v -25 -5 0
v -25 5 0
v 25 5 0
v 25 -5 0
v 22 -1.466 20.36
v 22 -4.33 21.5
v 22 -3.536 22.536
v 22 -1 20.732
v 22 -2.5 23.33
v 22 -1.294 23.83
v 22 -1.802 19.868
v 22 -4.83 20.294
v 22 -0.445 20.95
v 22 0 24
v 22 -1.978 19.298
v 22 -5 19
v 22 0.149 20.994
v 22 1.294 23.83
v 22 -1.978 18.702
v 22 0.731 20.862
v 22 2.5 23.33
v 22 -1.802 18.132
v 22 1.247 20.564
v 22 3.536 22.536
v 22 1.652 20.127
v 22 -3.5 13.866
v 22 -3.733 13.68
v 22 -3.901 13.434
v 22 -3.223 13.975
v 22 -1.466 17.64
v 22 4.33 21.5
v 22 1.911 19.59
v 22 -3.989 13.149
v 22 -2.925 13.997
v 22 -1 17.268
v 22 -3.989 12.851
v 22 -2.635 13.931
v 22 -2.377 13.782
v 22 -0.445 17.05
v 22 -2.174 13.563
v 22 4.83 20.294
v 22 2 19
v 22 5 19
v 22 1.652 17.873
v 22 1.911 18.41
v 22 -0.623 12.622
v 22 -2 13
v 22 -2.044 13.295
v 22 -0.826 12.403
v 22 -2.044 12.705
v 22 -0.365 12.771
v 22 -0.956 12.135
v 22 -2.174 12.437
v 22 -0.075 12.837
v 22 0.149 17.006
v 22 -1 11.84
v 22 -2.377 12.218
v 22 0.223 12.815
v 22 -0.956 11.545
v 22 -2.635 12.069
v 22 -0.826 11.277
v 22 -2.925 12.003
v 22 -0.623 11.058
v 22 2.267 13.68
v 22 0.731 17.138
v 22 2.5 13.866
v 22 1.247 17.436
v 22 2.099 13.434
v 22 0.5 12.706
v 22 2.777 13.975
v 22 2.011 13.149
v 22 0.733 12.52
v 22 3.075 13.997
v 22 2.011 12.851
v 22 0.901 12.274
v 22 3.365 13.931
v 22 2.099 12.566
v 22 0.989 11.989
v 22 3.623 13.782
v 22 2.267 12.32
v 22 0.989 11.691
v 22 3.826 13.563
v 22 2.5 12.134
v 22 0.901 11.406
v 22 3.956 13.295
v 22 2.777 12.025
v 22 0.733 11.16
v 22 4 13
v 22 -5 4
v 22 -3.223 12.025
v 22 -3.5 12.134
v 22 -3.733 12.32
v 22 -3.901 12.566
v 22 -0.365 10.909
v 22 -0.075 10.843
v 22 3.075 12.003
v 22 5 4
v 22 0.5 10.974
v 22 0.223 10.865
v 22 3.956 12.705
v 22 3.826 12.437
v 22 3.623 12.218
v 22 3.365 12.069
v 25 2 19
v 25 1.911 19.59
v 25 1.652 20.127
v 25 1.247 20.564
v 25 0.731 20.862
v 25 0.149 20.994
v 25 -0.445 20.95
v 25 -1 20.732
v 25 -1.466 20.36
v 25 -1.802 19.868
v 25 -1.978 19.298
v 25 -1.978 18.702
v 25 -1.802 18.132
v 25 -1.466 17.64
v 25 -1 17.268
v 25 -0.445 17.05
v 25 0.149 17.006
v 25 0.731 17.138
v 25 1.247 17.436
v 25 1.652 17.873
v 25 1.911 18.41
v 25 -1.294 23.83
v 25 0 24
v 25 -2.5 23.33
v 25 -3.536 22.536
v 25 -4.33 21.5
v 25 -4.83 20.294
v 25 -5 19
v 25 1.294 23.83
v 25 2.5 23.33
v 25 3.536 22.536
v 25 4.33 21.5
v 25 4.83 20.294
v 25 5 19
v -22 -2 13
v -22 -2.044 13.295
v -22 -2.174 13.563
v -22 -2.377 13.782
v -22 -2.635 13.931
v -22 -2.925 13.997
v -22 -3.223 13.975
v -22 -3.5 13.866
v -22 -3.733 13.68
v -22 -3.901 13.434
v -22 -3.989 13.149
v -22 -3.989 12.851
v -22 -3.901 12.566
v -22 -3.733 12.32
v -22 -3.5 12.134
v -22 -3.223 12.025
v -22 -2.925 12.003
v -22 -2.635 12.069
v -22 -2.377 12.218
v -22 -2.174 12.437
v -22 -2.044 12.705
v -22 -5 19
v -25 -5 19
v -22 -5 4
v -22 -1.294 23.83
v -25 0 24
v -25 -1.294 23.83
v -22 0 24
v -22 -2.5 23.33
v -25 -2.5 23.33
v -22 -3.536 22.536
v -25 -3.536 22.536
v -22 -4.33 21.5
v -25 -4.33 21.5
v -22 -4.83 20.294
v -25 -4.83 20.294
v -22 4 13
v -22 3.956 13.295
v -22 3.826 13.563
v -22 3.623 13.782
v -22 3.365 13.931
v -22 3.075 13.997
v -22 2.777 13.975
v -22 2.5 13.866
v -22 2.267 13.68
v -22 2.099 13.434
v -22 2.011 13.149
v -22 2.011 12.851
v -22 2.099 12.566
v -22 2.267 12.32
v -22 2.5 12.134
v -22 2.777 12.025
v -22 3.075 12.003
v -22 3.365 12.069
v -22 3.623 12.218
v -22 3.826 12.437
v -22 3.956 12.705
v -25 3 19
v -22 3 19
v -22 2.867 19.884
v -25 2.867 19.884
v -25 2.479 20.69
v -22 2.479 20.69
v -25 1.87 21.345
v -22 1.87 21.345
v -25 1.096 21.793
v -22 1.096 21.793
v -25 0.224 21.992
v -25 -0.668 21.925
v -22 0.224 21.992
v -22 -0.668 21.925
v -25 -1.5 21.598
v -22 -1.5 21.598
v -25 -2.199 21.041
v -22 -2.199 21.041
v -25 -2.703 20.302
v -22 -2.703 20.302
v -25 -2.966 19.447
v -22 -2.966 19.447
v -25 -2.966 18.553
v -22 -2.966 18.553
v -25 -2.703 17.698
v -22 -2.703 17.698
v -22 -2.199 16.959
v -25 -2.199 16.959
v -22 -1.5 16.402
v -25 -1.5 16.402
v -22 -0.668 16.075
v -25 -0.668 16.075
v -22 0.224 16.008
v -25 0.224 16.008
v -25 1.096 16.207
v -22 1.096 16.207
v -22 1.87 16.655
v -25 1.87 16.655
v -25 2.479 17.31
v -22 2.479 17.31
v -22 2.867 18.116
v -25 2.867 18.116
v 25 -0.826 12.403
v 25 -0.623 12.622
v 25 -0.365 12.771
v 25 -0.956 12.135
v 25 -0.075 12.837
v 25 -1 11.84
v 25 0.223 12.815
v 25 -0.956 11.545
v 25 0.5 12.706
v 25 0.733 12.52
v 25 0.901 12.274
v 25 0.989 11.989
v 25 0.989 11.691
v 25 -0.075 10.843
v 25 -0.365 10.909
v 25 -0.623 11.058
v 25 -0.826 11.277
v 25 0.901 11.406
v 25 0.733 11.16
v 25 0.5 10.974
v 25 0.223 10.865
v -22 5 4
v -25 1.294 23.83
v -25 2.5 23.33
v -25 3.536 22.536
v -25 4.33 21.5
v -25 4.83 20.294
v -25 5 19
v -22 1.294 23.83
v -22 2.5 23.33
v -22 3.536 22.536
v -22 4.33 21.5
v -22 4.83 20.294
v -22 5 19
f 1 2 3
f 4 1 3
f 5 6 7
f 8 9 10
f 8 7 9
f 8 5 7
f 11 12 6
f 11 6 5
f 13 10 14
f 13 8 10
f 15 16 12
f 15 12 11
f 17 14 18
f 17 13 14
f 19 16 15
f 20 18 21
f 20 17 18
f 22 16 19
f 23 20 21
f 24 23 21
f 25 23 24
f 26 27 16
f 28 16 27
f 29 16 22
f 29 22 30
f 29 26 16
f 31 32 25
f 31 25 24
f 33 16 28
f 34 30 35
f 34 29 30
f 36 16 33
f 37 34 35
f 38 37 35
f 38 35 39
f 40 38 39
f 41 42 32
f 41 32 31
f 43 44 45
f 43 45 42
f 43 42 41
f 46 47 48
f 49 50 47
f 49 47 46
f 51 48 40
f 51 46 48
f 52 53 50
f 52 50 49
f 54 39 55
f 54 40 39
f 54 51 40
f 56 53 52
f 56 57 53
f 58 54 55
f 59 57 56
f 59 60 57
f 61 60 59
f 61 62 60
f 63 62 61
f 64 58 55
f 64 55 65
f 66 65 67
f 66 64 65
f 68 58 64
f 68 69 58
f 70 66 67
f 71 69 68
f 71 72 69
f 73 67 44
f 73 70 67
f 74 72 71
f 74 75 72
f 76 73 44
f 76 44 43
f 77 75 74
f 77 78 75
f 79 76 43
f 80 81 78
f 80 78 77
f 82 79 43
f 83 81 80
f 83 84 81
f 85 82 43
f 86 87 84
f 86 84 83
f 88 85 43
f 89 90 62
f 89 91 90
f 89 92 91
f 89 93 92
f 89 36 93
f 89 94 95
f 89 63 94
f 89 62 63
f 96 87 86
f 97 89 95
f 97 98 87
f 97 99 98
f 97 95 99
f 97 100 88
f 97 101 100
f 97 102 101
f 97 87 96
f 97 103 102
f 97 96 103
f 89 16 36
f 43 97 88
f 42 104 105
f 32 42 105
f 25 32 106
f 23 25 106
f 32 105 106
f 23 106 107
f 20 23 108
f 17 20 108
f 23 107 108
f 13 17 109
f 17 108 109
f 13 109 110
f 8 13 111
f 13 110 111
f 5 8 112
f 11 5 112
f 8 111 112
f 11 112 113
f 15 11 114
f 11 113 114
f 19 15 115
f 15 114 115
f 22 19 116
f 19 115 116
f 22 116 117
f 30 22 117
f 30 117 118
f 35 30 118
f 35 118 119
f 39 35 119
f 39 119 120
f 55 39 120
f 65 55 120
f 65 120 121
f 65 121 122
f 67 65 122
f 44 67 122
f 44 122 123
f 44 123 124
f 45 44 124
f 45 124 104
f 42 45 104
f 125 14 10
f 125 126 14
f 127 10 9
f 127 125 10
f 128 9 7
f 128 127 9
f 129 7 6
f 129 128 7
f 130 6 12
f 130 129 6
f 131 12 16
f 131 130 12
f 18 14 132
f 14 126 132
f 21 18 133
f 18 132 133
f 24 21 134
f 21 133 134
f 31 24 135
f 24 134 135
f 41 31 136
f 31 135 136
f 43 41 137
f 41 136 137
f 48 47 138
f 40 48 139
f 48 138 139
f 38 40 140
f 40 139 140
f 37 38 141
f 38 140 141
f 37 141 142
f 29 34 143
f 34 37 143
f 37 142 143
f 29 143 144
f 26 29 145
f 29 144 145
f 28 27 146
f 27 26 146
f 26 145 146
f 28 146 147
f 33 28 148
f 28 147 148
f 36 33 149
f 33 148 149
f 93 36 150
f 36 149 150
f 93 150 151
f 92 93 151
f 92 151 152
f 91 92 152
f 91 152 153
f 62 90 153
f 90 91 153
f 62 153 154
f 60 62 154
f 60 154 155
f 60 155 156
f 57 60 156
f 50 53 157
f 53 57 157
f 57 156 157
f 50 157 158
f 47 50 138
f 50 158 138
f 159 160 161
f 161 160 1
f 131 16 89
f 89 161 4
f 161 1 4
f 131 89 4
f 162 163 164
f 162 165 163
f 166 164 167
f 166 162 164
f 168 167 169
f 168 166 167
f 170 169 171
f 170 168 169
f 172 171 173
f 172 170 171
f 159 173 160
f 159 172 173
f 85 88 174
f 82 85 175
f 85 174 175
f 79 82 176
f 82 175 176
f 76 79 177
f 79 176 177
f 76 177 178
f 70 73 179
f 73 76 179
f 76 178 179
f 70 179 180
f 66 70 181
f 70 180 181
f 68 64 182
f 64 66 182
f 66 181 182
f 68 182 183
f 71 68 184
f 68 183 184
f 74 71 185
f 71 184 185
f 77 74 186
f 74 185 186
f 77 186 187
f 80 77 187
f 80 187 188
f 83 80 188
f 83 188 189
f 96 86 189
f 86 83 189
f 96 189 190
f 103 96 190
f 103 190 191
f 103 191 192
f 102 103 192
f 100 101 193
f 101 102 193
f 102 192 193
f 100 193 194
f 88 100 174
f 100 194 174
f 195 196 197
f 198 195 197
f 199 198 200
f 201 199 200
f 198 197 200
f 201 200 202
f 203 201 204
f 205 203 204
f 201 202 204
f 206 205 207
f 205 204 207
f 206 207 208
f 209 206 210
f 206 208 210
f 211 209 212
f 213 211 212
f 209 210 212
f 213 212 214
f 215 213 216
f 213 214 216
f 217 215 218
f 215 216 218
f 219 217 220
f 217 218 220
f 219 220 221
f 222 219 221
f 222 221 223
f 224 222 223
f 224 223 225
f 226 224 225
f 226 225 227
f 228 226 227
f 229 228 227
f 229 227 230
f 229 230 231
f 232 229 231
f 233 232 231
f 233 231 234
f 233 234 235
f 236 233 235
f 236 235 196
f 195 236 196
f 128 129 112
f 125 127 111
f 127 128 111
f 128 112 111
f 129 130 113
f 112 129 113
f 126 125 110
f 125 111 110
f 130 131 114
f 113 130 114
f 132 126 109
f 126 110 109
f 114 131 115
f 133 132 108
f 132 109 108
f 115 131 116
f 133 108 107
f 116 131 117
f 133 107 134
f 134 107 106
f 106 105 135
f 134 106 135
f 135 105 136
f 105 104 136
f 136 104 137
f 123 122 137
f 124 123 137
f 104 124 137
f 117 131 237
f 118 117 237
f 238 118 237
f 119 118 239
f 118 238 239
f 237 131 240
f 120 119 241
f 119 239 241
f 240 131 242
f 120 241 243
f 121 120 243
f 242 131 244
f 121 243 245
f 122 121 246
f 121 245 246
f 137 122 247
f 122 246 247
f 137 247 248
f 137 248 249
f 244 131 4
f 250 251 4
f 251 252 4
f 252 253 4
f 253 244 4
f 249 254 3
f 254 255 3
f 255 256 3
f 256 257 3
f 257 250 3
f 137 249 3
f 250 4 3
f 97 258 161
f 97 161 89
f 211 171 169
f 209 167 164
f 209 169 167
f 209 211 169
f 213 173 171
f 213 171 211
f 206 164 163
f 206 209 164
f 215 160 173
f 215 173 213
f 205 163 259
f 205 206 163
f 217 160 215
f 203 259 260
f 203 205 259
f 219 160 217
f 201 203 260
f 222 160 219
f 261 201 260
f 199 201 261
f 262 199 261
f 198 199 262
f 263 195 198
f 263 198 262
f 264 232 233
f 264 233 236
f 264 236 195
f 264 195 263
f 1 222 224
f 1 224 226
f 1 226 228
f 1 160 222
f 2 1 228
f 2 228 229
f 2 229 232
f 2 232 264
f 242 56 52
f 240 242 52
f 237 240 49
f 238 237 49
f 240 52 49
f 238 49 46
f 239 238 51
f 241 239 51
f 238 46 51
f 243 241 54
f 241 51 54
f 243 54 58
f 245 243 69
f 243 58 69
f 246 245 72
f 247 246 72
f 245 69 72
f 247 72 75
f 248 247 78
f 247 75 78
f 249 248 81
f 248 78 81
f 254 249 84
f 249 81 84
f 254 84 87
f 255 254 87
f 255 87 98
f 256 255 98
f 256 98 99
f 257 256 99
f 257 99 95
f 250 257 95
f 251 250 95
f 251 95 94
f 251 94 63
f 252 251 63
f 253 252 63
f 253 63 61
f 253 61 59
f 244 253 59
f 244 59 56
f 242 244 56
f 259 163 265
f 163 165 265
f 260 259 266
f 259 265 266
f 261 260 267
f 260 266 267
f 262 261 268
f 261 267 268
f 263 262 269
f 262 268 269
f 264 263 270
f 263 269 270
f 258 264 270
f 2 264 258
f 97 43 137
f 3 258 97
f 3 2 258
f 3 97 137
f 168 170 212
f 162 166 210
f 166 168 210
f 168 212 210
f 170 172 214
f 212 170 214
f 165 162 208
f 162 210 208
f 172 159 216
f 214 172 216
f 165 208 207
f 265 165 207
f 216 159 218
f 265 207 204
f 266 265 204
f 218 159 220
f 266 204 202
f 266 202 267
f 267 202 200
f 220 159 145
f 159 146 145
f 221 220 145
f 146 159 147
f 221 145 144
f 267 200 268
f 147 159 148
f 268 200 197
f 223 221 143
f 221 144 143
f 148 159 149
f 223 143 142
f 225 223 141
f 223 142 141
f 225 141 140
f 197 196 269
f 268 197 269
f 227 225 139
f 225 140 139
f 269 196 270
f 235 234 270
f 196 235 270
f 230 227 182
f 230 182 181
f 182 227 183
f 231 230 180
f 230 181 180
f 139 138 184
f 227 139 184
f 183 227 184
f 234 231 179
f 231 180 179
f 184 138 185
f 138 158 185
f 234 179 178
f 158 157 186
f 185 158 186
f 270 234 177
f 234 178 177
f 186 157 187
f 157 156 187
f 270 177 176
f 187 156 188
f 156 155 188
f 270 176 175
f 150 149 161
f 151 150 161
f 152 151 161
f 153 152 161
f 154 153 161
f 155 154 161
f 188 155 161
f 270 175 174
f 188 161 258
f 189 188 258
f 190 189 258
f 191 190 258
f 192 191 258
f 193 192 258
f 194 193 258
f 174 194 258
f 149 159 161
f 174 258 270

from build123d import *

# Parameters (mm, degrees)
F0_W      = 50
F0_H      = 10
F1_DEPTH  = 4
F2_W      = 3
F2_H      = 10
F3_DEPTH  = 20
F4_R      = 4.99999
F5_R      = 2
F6_DEPTH  = 25
F7_R      = 3
F8_DEPTH  = 25
F9_R      = 1
F10_DEPTH = 46
F11_R     = 1
F12_DEPTH = 25


# Not quite as in the source:
# - a fillet or chamfer is up to 0.001 mm smaller than in the source, because OpenCascade refuses the exact size


with BuildPart() as f1:
    # F0 (on Top) → F1 (new body)
    with BuildSketch(Plane.XY):
        Rectangle(F0_W, F0_H)
    extrude(amount=F1_DEPTH)

    # F2 (on face) → F3 (join)
    with BuildSketch(Plane.XY.offset(4)):
        with Locations((23.5, 0)):
            Rectangle(F2_W, F2_H)
        with Locations((-23.5, 0)):
            Rectangle(F2_W, F2_H)
    extrude(amount=F3_DEPTH)

    # F4 (radius 5 in the source; OpenCascade refuses exactly that, so slightly less here)
    f4_edges = [f1.edges().sort_by_distance(p)[0] for p in [
        (-23.5, -5, 24),
        (-23.5, 5, 24),
        (23.5, -5, 24),
        (23.5, 5, 24),
    ]]
    fillet(f4_edges, radius=F4_R)

    # F5 (on face) → F6 (cut)
    with BuildSketch(Plane.YZ.offset(25)):
        with Locations((0, 19)):
            Circle(F5_R)
    extrude(amount=-F6_DEPTH, mode=Mode.SUBTRACT)

    # F7 (on face) → F8 (cut)
    with BuildSketch(Plane.YZ.offset(-22)):
        with Locations((0, 19)):
            Circle(F7_R)
    extrude(amount=-F8_DEPTH, mode=Mode.SUBTRACT)

    # F9 (on face) → F10 (join)
    with BuildSketch(Plane.YZ.offset(-22)):
        with Locations((-3, 13)):
            Circle(F9_R)
        with Locations((3, 13)):
            Circle(F9_R)
    extrude(amount=F10_DEPTH)

    # F11 (on face) → F12 (cut)
    with BuildSketch(Plane(origin=(22, 0, 0), x_dir=(0, -1, 0), z_dir=(-1, 0, 0))):
        with Locations((0, 11.84)):
            Circle(F11_R)
    extrude(amount=-F12_DEPTH, mode=Mode.SUBTRACT)


solid = f1.part
